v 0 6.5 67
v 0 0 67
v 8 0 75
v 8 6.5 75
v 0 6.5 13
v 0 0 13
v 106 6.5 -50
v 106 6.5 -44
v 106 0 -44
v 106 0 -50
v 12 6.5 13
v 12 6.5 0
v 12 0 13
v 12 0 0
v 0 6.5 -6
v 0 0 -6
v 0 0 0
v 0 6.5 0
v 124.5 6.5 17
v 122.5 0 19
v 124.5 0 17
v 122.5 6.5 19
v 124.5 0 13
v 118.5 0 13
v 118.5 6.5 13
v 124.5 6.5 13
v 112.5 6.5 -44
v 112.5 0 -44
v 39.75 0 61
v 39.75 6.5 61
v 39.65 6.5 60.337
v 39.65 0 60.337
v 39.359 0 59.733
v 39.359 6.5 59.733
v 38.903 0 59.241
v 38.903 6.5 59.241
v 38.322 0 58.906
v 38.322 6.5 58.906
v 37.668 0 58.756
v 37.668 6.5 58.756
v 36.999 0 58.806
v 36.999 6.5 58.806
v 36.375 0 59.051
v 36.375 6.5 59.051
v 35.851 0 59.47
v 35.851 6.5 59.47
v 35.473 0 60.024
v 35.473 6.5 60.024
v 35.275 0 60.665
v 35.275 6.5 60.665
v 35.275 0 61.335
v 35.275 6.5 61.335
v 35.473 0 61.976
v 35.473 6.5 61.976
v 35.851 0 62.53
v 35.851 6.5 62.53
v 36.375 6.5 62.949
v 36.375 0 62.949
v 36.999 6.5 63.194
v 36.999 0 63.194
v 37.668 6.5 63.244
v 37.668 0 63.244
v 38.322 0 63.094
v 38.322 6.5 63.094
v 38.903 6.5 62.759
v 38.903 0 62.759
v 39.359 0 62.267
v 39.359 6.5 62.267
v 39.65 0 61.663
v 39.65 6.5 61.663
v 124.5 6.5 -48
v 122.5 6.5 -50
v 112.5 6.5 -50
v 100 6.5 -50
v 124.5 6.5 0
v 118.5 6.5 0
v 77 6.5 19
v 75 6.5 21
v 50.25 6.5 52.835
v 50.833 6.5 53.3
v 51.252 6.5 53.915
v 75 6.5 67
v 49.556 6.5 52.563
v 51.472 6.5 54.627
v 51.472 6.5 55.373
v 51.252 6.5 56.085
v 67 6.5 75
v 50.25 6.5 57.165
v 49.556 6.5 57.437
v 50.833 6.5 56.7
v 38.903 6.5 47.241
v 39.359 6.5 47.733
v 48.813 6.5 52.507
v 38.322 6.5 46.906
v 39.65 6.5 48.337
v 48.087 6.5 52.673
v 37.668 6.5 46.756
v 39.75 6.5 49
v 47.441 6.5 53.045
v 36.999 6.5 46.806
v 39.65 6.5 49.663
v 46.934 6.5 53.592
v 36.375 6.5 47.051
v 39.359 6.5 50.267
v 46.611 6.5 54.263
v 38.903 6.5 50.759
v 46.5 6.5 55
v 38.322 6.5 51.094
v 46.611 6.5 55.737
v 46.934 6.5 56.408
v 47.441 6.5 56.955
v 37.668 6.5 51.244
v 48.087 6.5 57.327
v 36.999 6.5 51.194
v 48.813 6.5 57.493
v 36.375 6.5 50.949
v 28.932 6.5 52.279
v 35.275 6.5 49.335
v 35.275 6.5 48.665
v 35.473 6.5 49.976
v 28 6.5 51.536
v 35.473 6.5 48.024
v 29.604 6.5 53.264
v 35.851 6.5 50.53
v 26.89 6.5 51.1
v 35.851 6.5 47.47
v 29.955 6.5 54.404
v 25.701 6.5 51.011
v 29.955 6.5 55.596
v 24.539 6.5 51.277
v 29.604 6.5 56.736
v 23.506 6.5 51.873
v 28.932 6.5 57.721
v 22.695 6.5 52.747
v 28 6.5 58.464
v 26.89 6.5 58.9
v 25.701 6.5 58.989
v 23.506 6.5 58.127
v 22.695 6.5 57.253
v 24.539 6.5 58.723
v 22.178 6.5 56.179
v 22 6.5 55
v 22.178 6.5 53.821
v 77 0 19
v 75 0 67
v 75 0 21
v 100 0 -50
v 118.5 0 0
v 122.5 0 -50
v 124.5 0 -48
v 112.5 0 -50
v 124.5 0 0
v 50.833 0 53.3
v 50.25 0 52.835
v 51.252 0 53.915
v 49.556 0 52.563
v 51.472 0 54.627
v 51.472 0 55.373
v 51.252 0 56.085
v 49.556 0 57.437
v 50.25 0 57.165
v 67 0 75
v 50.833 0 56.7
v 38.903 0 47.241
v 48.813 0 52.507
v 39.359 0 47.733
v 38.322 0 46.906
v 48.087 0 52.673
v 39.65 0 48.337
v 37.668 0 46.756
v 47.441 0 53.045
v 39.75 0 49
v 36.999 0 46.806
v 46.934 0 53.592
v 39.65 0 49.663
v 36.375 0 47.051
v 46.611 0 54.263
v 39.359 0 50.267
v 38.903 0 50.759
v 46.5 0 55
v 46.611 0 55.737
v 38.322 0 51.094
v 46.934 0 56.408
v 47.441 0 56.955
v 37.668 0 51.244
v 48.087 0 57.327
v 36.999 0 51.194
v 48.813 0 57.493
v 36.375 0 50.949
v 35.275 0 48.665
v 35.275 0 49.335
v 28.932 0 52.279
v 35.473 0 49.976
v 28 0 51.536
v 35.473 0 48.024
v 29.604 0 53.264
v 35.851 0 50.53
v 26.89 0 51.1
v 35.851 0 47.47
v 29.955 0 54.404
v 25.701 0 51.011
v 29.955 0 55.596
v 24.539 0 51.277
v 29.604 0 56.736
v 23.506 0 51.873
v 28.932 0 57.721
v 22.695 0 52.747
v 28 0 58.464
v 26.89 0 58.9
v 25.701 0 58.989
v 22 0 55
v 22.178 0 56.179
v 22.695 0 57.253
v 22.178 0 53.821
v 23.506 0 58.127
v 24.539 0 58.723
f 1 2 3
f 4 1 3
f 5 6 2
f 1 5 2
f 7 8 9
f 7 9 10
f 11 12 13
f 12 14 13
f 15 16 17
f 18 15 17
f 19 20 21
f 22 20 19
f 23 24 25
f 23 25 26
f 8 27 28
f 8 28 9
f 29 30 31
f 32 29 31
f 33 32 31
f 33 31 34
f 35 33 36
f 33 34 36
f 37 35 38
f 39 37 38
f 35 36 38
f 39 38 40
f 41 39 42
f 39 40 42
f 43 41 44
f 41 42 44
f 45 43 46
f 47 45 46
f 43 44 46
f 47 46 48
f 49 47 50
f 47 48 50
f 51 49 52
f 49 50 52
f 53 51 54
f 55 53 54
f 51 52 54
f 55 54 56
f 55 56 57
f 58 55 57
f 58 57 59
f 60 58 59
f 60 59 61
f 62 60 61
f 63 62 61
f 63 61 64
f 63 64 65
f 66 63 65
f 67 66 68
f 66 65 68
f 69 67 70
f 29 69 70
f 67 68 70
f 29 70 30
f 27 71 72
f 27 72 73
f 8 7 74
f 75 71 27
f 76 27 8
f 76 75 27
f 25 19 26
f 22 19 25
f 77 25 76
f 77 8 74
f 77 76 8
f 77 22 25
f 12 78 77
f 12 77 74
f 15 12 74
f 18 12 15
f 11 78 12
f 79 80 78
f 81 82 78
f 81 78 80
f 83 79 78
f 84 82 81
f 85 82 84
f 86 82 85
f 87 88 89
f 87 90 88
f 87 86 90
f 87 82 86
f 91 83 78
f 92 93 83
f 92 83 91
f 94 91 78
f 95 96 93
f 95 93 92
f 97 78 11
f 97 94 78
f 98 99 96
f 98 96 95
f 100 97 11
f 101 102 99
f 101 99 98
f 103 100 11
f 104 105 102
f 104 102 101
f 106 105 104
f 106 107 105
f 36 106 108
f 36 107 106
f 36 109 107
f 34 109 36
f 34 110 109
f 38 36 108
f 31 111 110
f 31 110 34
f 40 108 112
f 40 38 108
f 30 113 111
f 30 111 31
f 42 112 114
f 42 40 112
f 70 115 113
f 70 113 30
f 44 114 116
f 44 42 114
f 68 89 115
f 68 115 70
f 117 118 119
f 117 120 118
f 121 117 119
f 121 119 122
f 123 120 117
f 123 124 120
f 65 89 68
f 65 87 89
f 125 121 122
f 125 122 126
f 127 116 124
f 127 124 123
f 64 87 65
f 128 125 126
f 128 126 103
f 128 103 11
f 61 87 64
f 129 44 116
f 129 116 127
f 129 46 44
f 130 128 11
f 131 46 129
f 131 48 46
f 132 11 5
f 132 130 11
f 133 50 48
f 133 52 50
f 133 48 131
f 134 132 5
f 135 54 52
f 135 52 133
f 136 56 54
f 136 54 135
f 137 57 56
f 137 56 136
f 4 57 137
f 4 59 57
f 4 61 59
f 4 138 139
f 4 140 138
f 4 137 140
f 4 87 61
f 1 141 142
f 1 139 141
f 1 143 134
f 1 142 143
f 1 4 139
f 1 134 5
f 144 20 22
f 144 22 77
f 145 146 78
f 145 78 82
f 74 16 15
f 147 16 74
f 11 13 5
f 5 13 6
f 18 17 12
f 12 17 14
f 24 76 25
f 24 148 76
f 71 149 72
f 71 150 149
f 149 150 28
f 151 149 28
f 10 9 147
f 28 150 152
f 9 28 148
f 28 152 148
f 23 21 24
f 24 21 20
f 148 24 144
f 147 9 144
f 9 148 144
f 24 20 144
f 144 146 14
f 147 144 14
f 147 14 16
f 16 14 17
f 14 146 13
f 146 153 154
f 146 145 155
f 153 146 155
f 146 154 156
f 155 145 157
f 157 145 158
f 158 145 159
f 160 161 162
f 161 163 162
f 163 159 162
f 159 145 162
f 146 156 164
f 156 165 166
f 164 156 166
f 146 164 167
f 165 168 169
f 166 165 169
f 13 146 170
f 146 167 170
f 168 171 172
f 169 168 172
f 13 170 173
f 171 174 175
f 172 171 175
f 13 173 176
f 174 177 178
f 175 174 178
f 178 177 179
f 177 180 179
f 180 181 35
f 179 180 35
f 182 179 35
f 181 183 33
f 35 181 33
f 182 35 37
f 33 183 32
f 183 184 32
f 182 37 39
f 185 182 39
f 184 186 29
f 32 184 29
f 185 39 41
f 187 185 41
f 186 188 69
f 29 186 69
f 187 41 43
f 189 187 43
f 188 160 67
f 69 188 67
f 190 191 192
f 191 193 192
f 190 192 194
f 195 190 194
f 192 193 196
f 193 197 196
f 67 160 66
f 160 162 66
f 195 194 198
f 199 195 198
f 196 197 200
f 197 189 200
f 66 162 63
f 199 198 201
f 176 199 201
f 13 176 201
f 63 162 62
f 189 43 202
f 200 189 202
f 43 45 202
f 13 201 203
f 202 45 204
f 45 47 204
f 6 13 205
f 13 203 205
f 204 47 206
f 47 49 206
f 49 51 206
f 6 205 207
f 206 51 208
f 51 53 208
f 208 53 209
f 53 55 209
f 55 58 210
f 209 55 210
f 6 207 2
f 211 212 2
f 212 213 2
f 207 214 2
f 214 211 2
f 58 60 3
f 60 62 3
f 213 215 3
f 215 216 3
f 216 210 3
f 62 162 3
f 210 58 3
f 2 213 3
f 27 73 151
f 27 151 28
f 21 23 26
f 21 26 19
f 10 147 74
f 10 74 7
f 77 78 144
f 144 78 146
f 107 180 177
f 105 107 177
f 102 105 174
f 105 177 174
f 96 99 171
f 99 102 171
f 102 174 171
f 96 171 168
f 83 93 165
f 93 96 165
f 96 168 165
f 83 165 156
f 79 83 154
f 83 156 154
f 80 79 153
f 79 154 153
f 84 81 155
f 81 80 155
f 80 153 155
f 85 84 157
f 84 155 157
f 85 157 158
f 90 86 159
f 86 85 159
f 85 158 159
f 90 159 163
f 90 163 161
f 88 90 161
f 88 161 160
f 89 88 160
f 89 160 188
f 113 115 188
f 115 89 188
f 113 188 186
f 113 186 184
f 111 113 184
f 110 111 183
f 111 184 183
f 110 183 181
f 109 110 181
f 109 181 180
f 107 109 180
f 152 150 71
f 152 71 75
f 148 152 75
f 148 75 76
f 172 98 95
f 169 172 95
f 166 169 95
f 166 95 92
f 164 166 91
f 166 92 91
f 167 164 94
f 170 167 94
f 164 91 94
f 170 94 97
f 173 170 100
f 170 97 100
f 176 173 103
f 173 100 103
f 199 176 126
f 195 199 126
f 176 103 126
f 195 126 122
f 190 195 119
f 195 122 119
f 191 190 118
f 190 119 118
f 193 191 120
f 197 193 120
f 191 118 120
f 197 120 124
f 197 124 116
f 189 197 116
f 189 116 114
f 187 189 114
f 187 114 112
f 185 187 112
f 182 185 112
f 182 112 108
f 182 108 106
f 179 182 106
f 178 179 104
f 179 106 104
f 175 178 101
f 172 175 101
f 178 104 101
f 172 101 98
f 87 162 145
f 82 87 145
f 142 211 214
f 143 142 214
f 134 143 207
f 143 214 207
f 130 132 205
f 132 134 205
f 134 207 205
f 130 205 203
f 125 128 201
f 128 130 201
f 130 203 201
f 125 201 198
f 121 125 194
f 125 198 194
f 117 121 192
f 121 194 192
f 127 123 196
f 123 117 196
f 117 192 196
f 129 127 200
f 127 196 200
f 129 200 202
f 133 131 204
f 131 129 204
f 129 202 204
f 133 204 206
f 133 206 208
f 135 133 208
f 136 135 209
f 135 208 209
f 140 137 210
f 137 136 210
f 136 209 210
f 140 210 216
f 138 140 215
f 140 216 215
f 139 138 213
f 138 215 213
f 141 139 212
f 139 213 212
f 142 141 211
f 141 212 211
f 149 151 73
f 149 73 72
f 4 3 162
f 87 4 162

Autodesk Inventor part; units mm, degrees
ref_plane "YZ Plane" through (0, 0, 0) normal (1, 0, 0) x (0, 1, 0)
ref_plane "XZ Plane" through (0, 0, 0) normal (0, 1, 0) x (-1, 0, 0)
ref_plane "XY Plane" through (0, 0, 0) normal (0, 0, 1) x (1, 0, 0)
sketch "Sketch1" plane through (0, 0, 0) normal (0, 1, 0) x (-1, 0, 0)
  line L0 (0, -6) -> (0, 0)
  line L1 (0, 0) -> (-12, 0)
  line L2 (-12, 0) -> (-12, 13)
  line L3 (-12, 13) -> (0, 13)
  line L4 (0, 13) -> (0, 67)
  line L5 (0, 67) -> (-8, 75)
  line L6 (-8, 75) -> (-67, 75)
  line L7 (-67, 75) -> (-75, 67)
  line L8 (0, -6) -> (-100, -50)
  line L9 (-100, -50) -> (-124.5, -50)
  line L10 (-124.5, -50) -> (-124.5, 0)
  line L11 (-124.5, 0) -> (-118.5, 0)
  line L12 (-118.5, 0) -> (-118.5, 13)
  line L13 (-118.5, 13) -> (-124.5, 13)
  line L14 (-124.5, 13) -> (-124.5, 19)
  line L15 (-124.5, 19) -> (-75, 19)
  line L16 (-75, 19) -> (-75, 67)
  circle A0 centre (-26, 55) radius 4
  circle A1 centre (-49, 55) radius 2.5
  line L17 (-106, -50) -> (-112.5, -50) construction
  line L18 (-112.5, -50) -> (-112.5, 13) construction
  line L19 (-112.5, 13) -> (-106, 13) construction
  line L20 (-106, 13) -> (-106, -50) construction
  dimension "d0" = 13
  dimension "d1" = 12
  dimension "d2" = 6
  dimension "d3" = 6
  dimension "d4" = 6
  dimension "d6" = 75
  dimension "d7" = 8
  dimension "d8" = 5
  dimension "d9" = 23
  dimension "d10" = 106.5
  dimension "d11" = 45
  dimension "d12" = 8
  dimension "d13" = 6.5
  dimension "d14" = 6
  dimension "d15" = 6
  dimension "d16" = 42
  dimension "d17" = 20
  dimension "d18" = 50
  dimension "d19" = 26
extrude "Extrusion1" add sketch "Sketch1" along normal blind 6.5
sketch "Sketch3" plane through (0, 6.5, 0) normal (0, 1, 0) x (1, 0, 0)
  line L0 (124.5, 0) -> (124.5, 50) projected
  line L1 (124.5, 50) -> (100, 50) projected
  line L2 (106, 50) -> (112.5, 50)
  line L3 (112.5, 50) -> (112.5, 44)
  line L4 (112.5, 44) -> (106, 44)
  line L5 (106, 44) -> (106, 50)
  dimension "d27" = 6
  dimension "d28" = 6.5
  dimension "d29" = 12
extrude "Extrusion3" cut sketch "Sketch3" against normal through all
chamfer "Chamfer1" distance 2 angle 45 3 edges at (75, 3.25, 19) (124.5, 3.25, 19) (124.5, 3.25, -50)
sketch "Sketch4" plane through (0, 6.5, 0) normal (0, 1, 0) x (1, 0, 0)
  line L0 (124.5, 0) -> (124.5, 48) projected
  circle A0 centre (26, -55) radius 4 projected
  circle A1 centre (49, -55) radius 2.5 projected
  circle A2 centre (37.5, -49) radius 2.25
  circle A3 centre (37.5, -61) radius 2.25
  line L1 (37.5, -49) -> (37.5, -61) construction
  line L2 (26, -55) -> (49, -55) construction
  point P0 (37.5, -55)
  dimension "d35" = 12
  dimension "d36" = 4.5
extrude "Extrusion4" cut sketch "Sketch4" against normal through all contours A2 | A3
equation "\"d2\" = d3"
equation "\"d4\" = d3"
properties part number "z_axis_top"
